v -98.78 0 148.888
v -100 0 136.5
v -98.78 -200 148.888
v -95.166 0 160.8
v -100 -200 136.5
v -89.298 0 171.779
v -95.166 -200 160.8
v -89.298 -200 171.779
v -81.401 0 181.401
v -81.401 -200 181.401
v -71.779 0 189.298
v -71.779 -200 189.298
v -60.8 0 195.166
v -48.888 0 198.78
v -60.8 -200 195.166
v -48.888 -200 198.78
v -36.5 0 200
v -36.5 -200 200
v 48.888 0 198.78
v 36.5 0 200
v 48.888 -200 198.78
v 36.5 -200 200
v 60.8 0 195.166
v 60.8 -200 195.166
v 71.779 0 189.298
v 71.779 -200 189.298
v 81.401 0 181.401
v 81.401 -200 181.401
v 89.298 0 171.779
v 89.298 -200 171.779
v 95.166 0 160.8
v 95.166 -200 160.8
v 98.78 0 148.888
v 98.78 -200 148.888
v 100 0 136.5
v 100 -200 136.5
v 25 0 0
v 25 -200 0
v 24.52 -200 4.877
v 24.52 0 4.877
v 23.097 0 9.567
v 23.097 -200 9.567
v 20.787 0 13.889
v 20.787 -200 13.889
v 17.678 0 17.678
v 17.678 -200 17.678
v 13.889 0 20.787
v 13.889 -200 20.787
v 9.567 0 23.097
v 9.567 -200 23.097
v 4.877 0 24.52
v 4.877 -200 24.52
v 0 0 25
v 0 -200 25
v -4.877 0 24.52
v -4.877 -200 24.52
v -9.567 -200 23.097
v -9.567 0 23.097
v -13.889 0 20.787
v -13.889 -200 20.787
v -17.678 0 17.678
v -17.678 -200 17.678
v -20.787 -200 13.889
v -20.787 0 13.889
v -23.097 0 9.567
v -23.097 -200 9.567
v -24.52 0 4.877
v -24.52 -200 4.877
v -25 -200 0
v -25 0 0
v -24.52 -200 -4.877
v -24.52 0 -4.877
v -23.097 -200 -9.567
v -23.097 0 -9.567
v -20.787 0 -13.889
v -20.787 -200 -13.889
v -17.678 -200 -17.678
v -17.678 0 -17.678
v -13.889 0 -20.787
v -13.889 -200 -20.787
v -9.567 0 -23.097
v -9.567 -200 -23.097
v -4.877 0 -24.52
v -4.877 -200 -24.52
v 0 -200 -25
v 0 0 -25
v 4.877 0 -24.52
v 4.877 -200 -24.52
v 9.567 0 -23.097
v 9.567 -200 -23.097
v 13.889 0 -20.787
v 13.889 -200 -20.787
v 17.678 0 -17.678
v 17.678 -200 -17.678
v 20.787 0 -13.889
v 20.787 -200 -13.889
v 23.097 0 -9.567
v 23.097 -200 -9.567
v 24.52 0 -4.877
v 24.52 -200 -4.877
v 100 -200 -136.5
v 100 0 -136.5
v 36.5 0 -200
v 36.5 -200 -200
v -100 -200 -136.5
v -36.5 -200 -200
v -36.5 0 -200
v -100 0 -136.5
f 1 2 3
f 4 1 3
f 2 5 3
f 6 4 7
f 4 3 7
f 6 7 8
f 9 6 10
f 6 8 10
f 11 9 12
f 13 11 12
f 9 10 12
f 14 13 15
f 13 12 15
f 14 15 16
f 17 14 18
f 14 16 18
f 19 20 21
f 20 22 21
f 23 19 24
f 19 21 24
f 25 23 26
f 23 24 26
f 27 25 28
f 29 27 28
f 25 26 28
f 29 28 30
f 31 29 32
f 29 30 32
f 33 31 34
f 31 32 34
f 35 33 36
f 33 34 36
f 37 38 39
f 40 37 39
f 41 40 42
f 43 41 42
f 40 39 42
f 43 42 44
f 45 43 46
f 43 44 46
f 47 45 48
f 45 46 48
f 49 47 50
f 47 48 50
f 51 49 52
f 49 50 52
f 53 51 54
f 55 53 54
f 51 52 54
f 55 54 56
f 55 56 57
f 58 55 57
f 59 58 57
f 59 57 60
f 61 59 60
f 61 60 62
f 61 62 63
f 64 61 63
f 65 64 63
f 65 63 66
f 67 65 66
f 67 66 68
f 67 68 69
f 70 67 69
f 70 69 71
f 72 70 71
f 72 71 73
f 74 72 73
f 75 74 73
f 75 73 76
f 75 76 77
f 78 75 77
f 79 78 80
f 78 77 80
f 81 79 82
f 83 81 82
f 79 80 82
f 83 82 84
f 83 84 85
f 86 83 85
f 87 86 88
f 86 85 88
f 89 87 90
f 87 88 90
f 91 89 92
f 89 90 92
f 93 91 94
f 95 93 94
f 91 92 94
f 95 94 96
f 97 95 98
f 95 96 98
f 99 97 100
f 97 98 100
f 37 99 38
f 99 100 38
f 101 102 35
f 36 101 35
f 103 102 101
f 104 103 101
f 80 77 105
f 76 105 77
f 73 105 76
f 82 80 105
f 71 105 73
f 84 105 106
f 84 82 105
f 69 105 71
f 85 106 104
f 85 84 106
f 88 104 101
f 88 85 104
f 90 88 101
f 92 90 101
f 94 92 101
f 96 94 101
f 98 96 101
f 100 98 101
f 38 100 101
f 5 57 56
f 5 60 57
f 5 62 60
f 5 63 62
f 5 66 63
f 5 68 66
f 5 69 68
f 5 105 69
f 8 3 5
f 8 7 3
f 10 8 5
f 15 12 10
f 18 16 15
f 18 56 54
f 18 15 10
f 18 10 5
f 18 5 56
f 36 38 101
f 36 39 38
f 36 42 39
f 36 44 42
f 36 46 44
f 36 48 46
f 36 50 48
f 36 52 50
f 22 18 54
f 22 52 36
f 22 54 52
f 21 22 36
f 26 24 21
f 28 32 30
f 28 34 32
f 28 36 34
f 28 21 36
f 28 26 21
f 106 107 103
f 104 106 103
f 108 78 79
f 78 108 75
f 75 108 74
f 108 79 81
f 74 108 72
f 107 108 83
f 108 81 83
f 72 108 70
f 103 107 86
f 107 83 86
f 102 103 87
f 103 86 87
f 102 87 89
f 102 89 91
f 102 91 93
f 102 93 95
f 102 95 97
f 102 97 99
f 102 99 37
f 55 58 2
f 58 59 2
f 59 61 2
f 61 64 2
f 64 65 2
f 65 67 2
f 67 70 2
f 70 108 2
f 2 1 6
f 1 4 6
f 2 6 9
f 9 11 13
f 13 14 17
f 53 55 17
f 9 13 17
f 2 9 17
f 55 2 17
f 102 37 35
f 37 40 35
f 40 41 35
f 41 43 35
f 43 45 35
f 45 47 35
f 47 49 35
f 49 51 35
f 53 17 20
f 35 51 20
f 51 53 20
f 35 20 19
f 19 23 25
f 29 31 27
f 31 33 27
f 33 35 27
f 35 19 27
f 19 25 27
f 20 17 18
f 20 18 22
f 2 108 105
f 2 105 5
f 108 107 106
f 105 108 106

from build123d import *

# Parameters (mm, degrees)
F0_W     = 200
F0_H     = 400
F1_DEPTH = 200
F2_R     = 25
F3_DEPTH = 200.001
F4_R     = 63.5
F5_SIZE  = 63.5


with BuildPart() as f1:
    # F0 (on Front) → F1 (new body)
    with BuildSketch(Plane.XZ):
        Rectangle(F0_W, F0_H)
    extrude(amount=F1_DEPTH)

    # F2 (on face) → F3 (cut, through all)
    with BuildSketch(Plane.XZ.offset(200)):
        Circle(F2_R)
    extrude(amount=-F3_DEPTH, mode=Mode.SUBTRACT)

    # F4
    f4_edges = [f1.edges().sort_by_distance(p)[0] for p in [
        (100, -100, 200),
        (-100, -100, 200),
    ]]
    fillet(f4_edges, radius=F4_R)

    # F5
    f5_edges = [f1.edges().sort_by_distance(p)[0] for p in [
        (-100, -100, -200),
        (100, -100, -200),
    ]]
    chamfer(f5_edges, length=F5_SIZE)


solid = f1.part
